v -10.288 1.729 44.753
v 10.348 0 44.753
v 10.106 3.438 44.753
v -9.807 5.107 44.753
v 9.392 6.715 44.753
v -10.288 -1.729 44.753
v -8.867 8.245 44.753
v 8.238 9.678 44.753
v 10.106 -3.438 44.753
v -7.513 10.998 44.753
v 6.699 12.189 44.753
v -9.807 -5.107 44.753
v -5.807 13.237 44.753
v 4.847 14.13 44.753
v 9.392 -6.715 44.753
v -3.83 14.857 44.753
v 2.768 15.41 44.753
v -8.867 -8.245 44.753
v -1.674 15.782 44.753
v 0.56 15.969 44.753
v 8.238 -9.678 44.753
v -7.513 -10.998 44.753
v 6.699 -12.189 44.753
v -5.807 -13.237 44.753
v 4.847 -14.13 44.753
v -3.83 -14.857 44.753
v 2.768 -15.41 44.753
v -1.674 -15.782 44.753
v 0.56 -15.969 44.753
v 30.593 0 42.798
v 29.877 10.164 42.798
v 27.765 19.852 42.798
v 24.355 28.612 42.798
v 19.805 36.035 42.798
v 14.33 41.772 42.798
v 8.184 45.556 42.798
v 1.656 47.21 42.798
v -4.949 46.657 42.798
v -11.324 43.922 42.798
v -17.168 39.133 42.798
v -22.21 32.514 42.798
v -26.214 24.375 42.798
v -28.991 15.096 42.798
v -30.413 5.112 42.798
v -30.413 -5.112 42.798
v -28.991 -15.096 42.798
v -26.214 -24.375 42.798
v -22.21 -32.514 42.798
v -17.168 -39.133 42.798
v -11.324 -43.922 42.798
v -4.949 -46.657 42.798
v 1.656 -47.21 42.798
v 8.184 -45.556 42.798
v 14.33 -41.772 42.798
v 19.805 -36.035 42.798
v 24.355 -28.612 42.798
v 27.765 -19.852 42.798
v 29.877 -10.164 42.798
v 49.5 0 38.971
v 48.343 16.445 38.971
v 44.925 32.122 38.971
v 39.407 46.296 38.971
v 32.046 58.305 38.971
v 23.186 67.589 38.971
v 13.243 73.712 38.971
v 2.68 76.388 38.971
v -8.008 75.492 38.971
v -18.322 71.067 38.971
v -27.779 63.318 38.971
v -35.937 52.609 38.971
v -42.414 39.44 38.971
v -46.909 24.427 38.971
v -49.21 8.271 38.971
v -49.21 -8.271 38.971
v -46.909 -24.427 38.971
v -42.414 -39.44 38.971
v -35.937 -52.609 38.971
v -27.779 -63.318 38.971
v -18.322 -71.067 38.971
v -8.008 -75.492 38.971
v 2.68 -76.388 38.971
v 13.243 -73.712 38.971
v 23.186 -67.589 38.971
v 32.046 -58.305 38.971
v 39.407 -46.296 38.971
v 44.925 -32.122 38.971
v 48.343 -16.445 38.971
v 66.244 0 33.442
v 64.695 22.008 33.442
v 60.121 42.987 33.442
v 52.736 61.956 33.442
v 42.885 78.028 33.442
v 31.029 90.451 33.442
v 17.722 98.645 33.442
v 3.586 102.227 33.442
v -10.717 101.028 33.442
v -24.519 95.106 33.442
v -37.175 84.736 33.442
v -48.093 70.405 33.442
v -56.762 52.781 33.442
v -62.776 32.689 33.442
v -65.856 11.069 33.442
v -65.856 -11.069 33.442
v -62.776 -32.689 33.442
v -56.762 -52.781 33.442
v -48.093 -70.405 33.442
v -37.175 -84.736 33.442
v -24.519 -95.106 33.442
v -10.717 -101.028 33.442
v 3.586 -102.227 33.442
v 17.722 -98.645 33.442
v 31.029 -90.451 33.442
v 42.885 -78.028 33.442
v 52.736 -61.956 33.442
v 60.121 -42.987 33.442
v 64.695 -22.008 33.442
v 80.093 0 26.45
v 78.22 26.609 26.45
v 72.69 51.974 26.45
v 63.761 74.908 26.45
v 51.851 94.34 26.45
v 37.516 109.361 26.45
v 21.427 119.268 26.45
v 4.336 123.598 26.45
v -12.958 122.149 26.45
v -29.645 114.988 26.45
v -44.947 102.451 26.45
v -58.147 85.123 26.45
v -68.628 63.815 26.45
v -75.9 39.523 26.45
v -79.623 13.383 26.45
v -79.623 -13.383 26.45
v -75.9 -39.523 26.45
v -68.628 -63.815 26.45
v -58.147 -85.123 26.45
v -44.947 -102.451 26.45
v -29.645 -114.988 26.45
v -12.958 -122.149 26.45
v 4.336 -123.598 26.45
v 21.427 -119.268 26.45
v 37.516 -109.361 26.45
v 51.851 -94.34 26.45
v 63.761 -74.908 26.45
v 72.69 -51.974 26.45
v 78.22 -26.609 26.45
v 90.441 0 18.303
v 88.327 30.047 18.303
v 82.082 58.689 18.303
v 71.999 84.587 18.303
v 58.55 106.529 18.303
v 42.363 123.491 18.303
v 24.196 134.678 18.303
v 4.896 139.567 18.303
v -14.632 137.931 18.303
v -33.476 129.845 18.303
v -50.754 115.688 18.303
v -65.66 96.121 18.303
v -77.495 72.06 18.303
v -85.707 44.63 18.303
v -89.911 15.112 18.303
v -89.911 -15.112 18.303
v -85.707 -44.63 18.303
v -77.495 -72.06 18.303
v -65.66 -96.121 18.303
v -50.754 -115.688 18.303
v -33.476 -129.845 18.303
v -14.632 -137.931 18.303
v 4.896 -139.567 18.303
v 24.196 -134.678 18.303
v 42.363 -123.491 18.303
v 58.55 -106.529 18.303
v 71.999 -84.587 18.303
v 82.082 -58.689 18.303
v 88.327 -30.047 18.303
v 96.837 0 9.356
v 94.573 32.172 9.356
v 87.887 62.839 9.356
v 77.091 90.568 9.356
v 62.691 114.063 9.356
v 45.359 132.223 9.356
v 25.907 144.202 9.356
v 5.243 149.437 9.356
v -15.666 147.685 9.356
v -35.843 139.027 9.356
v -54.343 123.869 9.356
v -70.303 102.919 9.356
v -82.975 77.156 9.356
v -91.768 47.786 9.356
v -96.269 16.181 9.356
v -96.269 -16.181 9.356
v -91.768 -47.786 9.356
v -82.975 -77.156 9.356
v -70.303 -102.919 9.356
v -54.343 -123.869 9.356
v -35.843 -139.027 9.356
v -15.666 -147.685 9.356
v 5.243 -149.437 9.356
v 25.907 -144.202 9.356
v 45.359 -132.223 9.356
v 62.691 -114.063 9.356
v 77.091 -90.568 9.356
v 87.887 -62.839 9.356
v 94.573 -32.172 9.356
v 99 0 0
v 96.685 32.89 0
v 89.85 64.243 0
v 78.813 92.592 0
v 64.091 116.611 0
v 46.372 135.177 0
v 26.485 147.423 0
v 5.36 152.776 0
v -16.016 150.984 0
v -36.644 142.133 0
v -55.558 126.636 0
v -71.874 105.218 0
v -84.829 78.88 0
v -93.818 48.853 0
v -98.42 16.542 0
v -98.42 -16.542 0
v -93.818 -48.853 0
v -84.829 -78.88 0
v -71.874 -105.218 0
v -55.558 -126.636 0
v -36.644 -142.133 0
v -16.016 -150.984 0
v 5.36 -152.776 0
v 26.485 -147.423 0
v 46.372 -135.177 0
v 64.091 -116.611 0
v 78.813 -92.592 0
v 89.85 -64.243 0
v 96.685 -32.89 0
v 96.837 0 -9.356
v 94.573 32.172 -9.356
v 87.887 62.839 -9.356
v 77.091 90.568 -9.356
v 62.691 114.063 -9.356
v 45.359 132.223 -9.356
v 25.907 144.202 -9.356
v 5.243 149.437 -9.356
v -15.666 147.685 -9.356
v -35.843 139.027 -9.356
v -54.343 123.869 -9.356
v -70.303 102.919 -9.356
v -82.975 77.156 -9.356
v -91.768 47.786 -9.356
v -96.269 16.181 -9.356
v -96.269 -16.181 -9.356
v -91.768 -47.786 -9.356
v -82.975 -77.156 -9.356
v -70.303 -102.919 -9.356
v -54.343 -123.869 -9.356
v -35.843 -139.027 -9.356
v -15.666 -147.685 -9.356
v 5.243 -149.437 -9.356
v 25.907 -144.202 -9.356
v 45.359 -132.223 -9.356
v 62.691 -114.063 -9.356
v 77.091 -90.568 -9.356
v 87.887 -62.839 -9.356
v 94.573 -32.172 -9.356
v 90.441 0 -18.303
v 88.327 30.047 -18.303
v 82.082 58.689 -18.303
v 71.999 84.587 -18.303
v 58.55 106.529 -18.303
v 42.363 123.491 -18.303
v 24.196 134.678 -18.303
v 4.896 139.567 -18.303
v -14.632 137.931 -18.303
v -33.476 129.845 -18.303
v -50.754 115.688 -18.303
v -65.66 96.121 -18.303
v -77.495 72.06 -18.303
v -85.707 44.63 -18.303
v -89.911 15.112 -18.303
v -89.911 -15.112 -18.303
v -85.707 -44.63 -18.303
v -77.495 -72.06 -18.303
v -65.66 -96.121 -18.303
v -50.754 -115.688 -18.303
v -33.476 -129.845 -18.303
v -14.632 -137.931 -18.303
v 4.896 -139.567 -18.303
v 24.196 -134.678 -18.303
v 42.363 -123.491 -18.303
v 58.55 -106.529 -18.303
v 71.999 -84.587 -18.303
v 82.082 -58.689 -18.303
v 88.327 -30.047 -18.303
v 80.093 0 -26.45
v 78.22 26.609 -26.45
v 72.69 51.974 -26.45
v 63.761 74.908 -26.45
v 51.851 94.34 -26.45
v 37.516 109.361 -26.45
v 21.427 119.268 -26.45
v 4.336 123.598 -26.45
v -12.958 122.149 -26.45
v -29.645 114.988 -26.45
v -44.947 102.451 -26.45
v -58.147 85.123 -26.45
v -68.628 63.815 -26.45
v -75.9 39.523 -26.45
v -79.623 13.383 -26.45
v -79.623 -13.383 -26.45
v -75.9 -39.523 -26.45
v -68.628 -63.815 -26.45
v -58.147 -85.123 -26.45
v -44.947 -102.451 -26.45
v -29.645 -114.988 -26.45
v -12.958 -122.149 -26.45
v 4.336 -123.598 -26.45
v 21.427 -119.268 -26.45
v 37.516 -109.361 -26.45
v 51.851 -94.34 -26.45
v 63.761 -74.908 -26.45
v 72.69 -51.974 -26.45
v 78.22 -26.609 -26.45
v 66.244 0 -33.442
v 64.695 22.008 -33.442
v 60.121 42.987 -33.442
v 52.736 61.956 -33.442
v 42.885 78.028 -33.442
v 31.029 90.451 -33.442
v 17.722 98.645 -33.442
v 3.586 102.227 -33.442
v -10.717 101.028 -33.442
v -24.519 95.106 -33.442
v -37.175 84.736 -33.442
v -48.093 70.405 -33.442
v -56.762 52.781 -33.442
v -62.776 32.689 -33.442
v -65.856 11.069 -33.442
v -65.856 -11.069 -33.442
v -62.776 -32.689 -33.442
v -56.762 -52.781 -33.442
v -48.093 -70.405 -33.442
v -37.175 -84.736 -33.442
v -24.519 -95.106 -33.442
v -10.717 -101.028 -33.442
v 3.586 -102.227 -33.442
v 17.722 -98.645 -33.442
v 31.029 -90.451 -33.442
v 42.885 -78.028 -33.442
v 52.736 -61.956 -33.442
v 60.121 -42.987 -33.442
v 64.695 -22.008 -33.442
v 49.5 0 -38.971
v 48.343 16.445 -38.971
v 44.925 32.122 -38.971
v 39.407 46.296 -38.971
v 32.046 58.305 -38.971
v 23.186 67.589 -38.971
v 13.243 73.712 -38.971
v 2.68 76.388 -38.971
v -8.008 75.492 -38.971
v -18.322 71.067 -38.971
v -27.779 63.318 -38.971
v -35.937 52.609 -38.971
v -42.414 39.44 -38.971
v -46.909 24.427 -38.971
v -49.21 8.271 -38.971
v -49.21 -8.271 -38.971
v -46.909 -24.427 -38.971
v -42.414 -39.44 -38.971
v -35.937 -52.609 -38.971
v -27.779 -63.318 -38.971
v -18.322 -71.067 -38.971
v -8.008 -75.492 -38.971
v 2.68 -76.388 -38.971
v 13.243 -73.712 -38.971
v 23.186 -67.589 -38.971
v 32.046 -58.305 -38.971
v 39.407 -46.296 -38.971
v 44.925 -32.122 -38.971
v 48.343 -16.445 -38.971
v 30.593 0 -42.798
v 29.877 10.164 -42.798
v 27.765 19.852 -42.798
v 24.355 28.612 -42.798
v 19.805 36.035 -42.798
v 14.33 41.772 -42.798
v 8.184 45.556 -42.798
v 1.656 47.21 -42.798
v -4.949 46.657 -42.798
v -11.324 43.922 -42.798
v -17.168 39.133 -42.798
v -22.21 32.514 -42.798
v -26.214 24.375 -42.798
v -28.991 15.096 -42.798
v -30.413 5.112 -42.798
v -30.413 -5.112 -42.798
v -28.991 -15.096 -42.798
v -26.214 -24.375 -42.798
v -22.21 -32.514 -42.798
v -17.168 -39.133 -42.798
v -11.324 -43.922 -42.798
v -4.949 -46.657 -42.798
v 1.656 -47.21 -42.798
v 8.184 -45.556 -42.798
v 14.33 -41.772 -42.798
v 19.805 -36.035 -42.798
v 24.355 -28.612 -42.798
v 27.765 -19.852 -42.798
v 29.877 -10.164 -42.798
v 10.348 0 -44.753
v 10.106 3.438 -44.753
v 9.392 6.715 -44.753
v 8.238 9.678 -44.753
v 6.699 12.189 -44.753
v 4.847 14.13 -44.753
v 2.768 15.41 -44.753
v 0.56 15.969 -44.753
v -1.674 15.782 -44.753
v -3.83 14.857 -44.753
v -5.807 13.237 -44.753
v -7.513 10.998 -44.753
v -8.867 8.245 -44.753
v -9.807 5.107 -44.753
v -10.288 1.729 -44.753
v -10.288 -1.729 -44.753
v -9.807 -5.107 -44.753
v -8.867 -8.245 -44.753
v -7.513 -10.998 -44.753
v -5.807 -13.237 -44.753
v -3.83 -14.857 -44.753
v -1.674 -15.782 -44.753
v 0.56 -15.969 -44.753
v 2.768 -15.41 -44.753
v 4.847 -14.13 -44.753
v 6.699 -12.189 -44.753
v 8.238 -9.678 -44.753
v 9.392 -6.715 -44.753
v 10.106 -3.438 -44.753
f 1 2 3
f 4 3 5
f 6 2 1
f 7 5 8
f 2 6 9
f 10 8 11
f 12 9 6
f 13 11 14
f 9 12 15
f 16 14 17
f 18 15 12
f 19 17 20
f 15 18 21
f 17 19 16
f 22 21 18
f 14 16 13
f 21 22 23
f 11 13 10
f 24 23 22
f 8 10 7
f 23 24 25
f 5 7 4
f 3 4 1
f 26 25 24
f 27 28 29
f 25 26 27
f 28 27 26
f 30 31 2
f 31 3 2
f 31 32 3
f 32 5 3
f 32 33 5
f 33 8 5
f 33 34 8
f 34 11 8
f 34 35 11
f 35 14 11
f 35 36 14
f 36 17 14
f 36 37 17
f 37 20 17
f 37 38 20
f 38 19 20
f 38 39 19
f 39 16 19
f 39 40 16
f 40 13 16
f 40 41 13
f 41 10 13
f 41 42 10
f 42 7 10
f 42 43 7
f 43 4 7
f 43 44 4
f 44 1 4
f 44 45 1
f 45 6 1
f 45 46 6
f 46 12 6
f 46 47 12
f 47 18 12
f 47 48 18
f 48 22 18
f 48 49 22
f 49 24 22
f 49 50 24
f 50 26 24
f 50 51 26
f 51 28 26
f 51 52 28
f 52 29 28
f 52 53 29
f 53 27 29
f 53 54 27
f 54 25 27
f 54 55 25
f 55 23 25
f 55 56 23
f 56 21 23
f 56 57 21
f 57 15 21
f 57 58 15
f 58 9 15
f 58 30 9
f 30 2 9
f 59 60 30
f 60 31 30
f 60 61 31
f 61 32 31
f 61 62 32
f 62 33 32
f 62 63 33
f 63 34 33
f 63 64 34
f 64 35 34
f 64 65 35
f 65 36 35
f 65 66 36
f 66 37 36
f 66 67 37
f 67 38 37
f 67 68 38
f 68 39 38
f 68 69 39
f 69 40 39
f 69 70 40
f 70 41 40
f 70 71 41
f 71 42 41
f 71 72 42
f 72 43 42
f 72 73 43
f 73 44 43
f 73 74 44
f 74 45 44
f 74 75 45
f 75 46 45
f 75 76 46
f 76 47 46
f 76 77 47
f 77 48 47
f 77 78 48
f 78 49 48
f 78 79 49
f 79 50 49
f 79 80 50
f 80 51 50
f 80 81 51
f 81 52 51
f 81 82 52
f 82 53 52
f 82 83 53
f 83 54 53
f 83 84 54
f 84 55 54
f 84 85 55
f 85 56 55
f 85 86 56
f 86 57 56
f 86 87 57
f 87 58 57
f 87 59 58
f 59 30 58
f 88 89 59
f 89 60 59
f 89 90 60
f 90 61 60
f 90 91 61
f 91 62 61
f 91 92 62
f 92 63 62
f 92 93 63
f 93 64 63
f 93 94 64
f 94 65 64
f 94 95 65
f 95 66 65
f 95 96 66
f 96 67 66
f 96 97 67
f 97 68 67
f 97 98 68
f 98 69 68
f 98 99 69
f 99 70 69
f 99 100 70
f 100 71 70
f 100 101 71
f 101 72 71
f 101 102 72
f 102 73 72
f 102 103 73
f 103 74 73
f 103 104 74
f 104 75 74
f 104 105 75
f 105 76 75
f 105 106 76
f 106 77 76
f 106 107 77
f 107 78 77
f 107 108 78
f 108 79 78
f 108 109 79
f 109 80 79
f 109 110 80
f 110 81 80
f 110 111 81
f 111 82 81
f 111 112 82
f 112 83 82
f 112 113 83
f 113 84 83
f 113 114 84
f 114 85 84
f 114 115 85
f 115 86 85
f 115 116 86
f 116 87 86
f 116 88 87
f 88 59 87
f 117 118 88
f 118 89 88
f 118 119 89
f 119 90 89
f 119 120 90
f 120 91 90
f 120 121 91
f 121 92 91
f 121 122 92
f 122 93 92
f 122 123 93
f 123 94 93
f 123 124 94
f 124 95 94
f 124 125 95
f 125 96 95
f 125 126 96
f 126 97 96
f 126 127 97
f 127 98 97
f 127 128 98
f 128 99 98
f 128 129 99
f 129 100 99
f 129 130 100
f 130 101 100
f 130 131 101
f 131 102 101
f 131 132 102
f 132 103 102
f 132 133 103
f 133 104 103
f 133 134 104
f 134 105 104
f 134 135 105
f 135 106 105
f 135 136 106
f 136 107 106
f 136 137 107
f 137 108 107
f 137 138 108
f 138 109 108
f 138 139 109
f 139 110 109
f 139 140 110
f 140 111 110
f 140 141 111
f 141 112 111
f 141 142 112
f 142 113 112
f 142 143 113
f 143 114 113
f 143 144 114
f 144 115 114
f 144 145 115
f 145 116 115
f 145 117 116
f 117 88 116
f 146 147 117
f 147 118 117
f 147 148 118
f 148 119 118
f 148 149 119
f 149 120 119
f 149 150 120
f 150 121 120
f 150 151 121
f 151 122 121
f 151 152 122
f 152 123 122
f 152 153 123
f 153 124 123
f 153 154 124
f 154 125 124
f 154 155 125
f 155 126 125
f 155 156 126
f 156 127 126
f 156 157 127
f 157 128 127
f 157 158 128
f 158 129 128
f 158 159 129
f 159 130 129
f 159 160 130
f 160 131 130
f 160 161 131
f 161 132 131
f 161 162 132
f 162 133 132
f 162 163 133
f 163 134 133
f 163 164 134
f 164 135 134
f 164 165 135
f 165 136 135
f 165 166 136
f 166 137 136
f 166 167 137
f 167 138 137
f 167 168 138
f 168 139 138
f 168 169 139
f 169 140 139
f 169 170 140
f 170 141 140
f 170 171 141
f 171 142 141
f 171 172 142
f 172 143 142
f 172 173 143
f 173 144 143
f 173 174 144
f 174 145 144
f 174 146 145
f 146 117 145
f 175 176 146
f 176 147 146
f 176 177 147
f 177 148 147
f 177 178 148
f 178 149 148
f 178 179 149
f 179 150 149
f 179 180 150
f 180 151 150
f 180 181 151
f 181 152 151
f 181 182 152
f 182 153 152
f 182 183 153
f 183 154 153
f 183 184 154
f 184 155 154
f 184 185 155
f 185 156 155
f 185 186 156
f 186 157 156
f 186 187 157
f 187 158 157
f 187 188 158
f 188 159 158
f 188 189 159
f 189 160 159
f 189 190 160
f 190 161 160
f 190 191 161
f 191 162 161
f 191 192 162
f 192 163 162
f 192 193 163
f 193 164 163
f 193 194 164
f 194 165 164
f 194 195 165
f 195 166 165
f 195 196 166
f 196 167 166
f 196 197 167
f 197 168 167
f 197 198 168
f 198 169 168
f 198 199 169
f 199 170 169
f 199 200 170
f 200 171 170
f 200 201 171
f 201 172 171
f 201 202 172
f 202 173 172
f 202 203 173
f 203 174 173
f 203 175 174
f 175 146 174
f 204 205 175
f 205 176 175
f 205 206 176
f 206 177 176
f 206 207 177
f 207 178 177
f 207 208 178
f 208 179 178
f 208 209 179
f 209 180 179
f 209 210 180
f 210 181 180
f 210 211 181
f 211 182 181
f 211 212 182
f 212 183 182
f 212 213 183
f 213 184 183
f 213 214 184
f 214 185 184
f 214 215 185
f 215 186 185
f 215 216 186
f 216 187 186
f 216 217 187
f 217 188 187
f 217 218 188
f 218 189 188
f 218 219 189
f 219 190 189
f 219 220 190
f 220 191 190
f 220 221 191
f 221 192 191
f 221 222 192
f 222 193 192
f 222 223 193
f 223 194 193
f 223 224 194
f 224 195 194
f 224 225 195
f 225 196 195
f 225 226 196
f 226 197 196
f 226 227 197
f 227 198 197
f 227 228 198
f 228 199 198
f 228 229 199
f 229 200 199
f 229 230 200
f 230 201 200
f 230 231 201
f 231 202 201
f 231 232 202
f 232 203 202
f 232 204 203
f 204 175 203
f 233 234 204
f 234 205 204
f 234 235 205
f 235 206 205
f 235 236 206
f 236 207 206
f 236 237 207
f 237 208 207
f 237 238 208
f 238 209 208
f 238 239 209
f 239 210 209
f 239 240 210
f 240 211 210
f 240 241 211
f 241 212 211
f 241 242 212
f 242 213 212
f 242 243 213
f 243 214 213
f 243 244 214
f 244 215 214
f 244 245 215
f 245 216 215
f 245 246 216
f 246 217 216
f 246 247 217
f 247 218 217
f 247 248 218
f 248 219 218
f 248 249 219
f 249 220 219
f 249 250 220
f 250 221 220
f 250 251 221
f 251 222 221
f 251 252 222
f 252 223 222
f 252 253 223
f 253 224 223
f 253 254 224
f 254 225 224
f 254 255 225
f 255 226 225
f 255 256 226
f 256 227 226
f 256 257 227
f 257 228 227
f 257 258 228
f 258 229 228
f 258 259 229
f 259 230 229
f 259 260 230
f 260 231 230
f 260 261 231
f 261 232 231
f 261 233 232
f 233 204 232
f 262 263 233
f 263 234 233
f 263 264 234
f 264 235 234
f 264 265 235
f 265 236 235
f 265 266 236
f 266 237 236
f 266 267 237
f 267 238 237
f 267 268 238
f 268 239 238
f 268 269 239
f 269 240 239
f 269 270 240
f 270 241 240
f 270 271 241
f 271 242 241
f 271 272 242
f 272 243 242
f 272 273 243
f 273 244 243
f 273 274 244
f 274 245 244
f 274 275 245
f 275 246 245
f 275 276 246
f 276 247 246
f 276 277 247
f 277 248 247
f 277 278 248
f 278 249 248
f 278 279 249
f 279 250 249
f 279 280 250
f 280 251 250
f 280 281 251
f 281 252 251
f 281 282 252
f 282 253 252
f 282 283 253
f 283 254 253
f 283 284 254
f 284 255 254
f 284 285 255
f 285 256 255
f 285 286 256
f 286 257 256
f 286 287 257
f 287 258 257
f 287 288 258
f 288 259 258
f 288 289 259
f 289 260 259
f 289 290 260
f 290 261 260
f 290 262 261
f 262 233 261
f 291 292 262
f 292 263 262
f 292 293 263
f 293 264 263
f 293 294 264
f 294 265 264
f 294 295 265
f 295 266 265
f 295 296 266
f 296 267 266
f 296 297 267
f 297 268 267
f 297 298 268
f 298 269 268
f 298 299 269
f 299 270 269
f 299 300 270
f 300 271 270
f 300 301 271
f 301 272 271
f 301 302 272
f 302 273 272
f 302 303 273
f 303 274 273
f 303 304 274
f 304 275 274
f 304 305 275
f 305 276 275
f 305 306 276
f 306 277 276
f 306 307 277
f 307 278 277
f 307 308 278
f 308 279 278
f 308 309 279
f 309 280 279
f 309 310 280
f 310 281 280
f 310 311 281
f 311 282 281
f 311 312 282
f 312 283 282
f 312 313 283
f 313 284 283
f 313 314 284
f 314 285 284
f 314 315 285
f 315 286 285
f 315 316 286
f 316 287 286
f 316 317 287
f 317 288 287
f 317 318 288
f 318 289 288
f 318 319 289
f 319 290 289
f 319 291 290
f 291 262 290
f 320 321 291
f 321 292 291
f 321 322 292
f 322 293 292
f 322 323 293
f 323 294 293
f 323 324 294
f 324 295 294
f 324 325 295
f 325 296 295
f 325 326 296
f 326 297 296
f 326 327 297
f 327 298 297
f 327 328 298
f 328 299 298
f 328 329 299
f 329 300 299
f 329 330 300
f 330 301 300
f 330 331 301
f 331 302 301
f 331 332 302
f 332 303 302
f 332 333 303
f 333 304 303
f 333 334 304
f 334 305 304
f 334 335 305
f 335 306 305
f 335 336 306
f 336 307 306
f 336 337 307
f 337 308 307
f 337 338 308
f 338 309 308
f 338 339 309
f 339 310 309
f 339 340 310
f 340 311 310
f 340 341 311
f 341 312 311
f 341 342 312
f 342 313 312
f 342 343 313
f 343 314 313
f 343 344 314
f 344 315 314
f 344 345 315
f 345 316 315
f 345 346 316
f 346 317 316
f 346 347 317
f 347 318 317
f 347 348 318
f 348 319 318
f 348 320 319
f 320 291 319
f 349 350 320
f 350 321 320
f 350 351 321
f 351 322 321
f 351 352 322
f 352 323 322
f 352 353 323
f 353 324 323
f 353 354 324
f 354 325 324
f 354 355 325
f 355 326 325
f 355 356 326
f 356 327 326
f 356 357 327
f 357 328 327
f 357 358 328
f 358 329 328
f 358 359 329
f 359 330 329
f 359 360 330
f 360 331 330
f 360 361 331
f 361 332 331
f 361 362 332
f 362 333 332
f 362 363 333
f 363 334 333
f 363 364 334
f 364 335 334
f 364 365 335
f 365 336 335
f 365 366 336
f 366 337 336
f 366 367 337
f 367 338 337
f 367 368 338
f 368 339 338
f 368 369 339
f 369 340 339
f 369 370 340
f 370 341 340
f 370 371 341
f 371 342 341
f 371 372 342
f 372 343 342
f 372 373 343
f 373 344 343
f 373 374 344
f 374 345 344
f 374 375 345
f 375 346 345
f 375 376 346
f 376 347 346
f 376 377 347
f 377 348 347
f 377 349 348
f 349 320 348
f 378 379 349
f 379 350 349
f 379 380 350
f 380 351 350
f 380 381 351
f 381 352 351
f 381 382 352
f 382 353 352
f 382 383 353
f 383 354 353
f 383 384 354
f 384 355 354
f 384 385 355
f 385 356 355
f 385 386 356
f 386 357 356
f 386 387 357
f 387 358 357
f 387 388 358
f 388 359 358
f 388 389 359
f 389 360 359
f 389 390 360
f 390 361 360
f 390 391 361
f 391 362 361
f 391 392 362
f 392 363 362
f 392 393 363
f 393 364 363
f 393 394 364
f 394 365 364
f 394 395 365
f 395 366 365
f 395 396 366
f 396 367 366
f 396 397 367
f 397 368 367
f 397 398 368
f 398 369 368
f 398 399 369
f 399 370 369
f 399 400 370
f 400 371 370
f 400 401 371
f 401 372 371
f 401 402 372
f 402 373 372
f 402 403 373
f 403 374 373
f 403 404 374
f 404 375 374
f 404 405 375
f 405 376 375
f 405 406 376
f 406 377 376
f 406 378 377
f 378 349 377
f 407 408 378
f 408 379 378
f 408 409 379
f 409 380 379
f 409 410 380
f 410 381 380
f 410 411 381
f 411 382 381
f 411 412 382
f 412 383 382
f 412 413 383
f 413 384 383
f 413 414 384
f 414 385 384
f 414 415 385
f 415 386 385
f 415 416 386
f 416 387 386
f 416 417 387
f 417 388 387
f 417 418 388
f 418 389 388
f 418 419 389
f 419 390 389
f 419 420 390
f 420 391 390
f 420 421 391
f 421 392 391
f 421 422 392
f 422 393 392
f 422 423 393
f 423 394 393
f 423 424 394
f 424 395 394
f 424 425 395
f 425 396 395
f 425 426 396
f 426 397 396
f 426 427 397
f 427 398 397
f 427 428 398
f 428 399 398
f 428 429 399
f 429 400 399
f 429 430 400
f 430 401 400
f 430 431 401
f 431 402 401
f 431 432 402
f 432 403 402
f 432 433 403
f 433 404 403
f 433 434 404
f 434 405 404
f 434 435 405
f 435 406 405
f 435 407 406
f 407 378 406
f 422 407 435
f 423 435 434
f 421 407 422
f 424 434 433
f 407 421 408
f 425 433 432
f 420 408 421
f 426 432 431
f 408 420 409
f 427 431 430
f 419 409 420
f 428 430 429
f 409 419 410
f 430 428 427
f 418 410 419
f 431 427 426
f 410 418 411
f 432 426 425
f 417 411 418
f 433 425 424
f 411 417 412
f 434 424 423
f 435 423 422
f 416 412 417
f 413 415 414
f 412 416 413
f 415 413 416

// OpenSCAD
// Generated by SolidPython 1.0.1 on 2020-07-29 00:46:50


scale(v = [11, 17, 5]) {
	sphere(r = 9);
}
/***********************************************
*********      SolidPython code:      **********
************************************************
 
# import packages: SolidPython
from solid import *
from solid.utils import *
from itertools import chain, combinations, permutations


class Resize:

    def __init__(self, scad_file):
        self.scad_file = scad_file
        #self.scad_file = import_scad(scad_file)
        # cone/cylinder param:
        self.r1 = 0
        self.r2 = 0
        self.h = 0
        # rectangular prism param:
        self.w = 0
        self.l = 0
        # ellipse param:
        self.r = 0

    # import OpenScad code (file name corresponds to shape)


    # classify shape + parameters
    def assign(self, param1, param2, param3):
        if self.scad_file == 'cone.scad':
            self.r1 = param1
            self.r2 = param2
            self.h = param3
        elif self.scad_file == 'cylinder.scad':
            self.r1 = param1
            self.r2 = param2
            self.h = param3
        elif self.scad_file == 'rectangularPrism.scad':
            self.h = param1
            self.l = param2
            self.w = param3
        else:
            self.r = param1
            self.h = param2

    # resize parameters
    def iterate(self):
        x = range(3, 20, 2)
        i = 1
        if self.scad_file == 'cone.scad':
            tempList = list(permutations(x, 2))
            for temp in tempList:
                param1 = temp[0]
                param2 = temp[1]
                filepath = 'produced_scad_files/' + 'cone' + str(param1) + '_' + str(param2) + '_' + '.scad'
                scad_render_to_file(cylinder(h=param1, r1=param2, r2=0), filepath)

        elif self.scad_file == 'cylinder.scad':
            tempList = list(permutations(x, 3))
            for temp in tempList:
                param1 = temp[0]
                param2 = temp[1]
                filepath = 'produced_scad_files/' + 'cylinder' + str(param1) + '_' + str(param2) + '_' + '.scad'
                scad_render_to_file(cylinder(h=param1, r1=param2, r2=param2), filepath)

        elif self.scad_file == 'rectangularPrism.scad':
            tempList = list(permutations(x, 3))
            for temp in tempList:
                param1 = temp[0]
                param2 = temp[1]
                param3 = temp[2]
                filepath = 'produced_scad_files/' + 'rectangularPrism' + str(param1) + '_' + str(param2) + '_' + str(
                    param3) + '.scad'
                scad_render_to_file(cube(size=(param1, param2, param3)), filepath)

        elif self.scad_file == 'ellipse.scad':
            tempList = list(permutations(x, 4))
            for temp in tempList:
                param1 = temp[0]
                param2 = temp[1]
                param3 = temp[2]
                param4 = temp[3]
                filepath = 'produced_scad_files/' + 'ellipse' + str(param1) + '_' + str(param2) + '_' + str(param3) + '_' + str(param4) + '.scad'
                scad_render_to_file(scale([param1, param2, param3])(sphere(r=param4)), filepath)

    def render_to_scadfile(self):
        scad_render_to_file(scad, 'example.scad') 
 
************************************************/
